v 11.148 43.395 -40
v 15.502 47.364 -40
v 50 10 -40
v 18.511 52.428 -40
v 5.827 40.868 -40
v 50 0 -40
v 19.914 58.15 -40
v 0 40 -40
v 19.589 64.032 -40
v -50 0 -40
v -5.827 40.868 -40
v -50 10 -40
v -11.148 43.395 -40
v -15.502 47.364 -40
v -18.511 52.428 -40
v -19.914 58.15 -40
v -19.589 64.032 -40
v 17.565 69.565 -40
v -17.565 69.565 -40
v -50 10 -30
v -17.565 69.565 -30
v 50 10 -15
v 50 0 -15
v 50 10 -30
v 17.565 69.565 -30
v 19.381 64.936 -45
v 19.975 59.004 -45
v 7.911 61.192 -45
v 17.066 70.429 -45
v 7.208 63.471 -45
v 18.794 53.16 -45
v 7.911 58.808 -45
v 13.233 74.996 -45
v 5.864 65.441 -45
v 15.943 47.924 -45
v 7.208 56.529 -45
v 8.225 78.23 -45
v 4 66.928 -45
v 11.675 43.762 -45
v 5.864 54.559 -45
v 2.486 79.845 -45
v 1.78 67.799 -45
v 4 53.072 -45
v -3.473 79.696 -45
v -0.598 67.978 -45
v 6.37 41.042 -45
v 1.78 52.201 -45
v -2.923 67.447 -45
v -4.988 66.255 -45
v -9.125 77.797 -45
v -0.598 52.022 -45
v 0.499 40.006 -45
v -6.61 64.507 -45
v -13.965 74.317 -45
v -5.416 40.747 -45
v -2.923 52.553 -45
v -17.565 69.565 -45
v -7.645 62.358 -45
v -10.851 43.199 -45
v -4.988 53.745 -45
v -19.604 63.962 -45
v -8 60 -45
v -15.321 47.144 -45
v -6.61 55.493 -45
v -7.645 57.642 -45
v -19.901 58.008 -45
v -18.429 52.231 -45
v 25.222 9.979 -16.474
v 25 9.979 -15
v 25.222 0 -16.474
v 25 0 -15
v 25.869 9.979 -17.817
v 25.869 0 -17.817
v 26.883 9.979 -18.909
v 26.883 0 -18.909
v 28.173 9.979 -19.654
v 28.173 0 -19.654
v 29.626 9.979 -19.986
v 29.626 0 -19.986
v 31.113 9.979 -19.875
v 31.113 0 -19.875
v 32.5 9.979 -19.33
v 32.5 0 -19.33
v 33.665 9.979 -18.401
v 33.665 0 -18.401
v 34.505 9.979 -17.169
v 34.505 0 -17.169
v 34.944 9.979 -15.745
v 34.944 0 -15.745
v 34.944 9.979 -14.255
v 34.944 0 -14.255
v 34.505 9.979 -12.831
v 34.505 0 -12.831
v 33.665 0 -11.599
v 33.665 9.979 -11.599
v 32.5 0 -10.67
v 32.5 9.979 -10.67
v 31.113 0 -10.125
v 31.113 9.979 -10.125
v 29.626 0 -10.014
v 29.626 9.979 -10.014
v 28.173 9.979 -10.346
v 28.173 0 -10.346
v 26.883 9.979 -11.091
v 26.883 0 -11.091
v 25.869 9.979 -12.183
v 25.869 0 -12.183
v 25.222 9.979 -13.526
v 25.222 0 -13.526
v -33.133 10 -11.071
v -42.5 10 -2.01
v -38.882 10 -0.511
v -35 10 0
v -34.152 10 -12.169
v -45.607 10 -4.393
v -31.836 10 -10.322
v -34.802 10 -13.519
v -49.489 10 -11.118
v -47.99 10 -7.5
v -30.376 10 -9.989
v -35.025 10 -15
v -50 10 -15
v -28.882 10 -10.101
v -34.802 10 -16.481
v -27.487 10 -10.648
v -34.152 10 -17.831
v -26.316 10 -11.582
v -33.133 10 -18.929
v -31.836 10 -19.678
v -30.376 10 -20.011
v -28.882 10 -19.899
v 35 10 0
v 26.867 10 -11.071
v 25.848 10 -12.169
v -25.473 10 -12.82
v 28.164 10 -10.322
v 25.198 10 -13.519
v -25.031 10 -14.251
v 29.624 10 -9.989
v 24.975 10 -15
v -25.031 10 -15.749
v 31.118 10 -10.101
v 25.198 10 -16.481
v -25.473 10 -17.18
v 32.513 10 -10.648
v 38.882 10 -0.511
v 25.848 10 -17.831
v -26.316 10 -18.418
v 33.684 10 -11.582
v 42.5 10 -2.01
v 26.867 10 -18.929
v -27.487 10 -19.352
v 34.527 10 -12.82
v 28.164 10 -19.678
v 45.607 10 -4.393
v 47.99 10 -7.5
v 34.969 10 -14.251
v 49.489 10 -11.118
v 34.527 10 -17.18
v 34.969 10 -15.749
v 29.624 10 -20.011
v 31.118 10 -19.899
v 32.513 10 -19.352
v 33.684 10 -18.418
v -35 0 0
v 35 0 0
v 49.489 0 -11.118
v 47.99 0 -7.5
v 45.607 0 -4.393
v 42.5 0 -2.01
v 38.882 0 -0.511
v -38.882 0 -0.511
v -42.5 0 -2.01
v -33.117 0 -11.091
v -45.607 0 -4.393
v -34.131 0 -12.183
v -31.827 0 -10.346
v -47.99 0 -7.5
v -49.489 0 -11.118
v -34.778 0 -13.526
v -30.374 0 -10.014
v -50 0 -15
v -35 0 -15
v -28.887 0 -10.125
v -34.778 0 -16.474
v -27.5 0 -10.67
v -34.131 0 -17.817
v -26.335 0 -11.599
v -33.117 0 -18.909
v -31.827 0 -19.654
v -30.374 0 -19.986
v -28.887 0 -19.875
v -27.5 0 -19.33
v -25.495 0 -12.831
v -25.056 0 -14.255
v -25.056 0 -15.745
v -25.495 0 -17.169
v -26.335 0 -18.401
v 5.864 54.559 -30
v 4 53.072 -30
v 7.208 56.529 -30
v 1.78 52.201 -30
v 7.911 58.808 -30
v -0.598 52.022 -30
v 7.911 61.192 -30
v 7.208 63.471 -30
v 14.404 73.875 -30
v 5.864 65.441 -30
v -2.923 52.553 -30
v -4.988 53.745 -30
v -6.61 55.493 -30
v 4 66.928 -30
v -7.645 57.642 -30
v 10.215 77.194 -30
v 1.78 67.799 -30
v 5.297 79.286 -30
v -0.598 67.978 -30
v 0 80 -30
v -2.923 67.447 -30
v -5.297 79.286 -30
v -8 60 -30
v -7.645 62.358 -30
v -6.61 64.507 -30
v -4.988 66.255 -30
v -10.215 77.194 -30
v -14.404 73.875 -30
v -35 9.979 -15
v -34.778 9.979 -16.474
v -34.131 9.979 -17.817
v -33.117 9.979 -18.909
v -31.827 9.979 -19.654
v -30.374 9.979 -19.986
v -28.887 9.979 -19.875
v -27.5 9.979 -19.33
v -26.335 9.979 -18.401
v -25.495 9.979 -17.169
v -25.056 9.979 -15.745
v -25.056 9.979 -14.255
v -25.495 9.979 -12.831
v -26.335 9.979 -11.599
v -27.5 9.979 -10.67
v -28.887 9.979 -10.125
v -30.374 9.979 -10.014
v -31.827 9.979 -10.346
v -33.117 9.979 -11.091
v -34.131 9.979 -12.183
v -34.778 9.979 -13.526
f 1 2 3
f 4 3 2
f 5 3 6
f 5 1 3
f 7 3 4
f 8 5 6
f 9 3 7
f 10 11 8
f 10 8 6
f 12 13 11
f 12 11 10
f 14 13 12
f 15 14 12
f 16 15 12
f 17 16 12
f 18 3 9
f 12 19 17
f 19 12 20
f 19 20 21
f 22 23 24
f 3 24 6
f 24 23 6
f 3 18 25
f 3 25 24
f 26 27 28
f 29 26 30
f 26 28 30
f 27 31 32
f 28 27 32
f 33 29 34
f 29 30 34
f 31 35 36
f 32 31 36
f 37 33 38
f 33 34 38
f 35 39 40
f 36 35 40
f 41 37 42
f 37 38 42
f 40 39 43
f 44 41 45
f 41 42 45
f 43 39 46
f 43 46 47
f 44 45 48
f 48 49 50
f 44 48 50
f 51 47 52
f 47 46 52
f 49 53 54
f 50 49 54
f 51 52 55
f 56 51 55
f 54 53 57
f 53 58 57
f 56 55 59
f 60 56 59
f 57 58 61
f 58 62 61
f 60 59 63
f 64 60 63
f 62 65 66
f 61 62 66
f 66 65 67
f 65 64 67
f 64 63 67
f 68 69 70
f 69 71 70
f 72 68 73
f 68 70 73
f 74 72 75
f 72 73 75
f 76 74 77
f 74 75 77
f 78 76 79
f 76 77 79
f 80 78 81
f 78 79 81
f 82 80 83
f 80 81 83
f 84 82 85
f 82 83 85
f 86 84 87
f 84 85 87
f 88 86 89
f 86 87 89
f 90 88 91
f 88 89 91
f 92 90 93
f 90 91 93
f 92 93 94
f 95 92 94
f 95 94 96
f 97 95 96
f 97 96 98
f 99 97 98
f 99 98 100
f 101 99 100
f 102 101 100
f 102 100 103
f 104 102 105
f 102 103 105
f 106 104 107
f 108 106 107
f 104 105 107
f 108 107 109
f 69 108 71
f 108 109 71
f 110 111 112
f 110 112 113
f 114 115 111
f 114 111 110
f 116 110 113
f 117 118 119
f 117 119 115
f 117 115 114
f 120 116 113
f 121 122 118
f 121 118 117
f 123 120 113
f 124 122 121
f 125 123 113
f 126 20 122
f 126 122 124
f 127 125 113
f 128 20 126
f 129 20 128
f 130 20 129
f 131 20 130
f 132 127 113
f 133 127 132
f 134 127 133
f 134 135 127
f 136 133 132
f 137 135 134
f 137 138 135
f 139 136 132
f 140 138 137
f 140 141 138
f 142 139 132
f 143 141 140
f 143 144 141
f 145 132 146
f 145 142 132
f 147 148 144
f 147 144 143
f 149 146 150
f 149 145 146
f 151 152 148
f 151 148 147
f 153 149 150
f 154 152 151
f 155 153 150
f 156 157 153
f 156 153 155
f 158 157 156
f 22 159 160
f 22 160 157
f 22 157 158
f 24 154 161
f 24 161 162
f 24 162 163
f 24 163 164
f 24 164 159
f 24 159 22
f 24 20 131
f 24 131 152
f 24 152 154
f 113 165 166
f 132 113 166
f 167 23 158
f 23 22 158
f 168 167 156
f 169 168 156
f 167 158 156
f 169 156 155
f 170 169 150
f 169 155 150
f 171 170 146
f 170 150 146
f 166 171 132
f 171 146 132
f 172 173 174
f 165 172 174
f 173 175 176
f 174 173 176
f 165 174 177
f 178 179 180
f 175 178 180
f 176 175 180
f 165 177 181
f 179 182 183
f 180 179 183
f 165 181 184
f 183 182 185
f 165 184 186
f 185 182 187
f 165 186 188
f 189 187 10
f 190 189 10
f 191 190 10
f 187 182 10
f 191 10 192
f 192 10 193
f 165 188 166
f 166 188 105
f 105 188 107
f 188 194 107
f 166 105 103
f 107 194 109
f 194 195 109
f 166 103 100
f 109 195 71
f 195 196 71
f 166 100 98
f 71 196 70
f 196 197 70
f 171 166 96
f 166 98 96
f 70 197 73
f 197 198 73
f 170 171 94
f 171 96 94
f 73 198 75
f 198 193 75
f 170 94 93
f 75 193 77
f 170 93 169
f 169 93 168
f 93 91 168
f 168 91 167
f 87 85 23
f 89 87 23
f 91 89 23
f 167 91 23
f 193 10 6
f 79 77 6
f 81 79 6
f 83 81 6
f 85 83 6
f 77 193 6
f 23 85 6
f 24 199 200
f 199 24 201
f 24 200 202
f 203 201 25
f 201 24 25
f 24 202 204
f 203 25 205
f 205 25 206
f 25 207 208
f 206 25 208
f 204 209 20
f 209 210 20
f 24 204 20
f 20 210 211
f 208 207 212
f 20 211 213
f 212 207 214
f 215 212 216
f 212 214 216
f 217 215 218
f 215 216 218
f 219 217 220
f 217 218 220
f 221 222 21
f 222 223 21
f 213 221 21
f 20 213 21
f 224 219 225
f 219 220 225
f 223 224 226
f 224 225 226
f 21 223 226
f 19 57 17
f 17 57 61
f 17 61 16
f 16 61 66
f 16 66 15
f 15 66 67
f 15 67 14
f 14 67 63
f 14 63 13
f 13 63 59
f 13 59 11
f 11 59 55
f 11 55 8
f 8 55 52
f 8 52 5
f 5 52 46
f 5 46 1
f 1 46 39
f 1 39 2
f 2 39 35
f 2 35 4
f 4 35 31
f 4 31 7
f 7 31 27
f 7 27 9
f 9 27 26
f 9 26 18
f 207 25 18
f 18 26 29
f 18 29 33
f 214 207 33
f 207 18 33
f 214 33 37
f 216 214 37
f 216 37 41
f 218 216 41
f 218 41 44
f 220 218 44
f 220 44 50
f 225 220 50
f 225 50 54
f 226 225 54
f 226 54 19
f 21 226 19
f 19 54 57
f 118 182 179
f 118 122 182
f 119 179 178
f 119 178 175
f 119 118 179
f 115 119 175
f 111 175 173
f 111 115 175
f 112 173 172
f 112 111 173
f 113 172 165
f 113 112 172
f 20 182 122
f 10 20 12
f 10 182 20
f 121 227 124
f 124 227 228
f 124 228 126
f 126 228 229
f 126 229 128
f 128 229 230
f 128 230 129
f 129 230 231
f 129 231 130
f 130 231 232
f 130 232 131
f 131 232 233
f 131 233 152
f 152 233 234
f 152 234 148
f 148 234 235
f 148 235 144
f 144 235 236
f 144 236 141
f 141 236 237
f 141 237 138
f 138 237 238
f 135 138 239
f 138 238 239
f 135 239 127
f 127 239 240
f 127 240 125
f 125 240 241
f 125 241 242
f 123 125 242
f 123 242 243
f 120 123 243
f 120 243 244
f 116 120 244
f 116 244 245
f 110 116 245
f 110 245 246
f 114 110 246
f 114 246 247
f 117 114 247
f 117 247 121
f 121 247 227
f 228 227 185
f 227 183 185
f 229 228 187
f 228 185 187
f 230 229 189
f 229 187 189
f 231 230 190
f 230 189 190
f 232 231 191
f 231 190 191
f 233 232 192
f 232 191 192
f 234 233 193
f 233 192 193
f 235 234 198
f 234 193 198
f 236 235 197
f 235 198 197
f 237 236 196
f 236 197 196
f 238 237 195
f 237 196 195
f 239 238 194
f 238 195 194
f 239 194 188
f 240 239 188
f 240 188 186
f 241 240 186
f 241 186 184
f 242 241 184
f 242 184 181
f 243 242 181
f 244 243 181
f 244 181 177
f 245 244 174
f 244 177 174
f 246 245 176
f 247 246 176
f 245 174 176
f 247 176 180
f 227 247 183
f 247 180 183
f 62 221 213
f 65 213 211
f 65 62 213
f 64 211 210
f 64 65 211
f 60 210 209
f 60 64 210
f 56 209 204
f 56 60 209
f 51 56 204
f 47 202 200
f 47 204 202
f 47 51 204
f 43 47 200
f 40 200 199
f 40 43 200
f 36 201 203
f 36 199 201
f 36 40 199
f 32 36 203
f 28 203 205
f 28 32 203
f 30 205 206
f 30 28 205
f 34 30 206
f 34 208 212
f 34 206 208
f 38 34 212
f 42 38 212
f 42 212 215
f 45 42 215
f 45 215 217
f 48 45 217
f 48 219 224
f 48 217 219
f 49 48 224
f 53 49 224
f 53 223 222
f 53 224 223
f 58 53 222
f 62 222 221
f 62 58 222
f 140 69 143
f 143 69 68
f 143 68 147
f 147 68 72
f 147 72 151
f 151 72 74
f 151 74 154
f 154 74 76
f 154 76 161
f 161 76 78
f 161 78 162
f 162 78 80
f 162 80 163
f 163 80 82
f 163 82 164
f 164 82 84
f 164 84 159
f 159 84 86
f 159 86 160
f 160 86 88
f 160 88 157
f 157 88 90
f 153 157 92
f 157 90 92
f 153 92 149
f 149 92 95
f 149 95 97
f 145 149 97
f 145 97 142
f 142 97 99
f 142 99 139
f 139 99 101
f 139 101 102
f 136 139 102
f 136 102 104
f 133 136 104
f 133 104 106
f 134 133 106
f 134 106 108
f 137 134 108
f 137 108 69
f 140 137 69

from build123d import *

# Parameters (mm, degrees)
CROQUIS1_W                           = 100
CROQUIS1_H                           = 40
SALIENTE_EXTRUIR1_DEPTH              = 10
CROQUIS2_R                           = 8
SALIENTE_EXTRUIR2_DEPTH              = 10
SALIENTE_EXTRUIR3_START              = -15
CROQUIS3_R                           = 20
CROQUIS3_R_2                         = 8
SALIENTE_EXTRUIR3_DEPTH              = 15
F_10_0_10_DIAMETER_HOLE1_D           = 10
F_10_0_10_DIAMETER_HOLE1_CSINK_D     = 10.05
F_10_0_10_DIAMETER_HOLE1_CSINK_ANGLE = 100
F_10_0_10_DIAMETER_HOLE2_D           = 10
F_10_0_10_DIAMETER_HOLE2_CSINK_D     = 10.05
F_10_0_10_DIAMETER_HOLE2_CSINK_ANGLE = 100
REDONDEO2_R                          = 15


with BuildPart() as part:
    # Croquis1 → Saliente-Extruir1 (new body)
    with BuildSketch(Plane(origin=(0, 0, 0), x_dir=(1, 0, 0), z_dir=(0, 1, 0))):
        with Locations((0, 20)):
            Rectangle(CROQUIS1_W, CROQUIS1_H)
    extrude(amount=SALIENTE_EXTRUIR1_DEPTH)

    # Croquis2 → Saliente-Extruir2 (add)
    with BuildSketch(Plane(origin=(0, 0, -40), x_dir=(-1, 0, 0), z_dir=(0, 0, -1))):
        with BuildLine():
            Line((-17.564659966, 69.564659966), (-50, 10))
            Line((-50, 10), (50, 10))
            Line((50, 10), (17.564659966, 69.564659966))
            ThreePointArc((17.564659966, 69.564659966), (0, 80), (-17.564659966, 69.564659966))
        make_face()
        with Locations((0, 60)):
            Circle(CROQUIS2_R, mode=Mode.SUBTRACT)
    extrude(amount=-SALIENTE_EXTRUIR2_DEPTH)

    # Croquis3 → Saliente-Extruir3 (add)
    with BuildSketch(Plane.XY.offset(-30).offset(SALIENTE_EXTRUIR3_START)):
        with Locations(Location((0, 60, 0), (0, 0, 151.429940189))):
            Circle(CROQUIS3_R)
        with Locations(Location((0, 60, 0), (0, 0, 180))):
            Circle(CROQUIS3_R_2, mode=Mode.SUBTRACT)
    extrude(amount=SALIENTE_EXTRUIR3_DEPTH)

    # Ø10.0 (10) Diameter Hole1 (through all)
    with Locations(Plane(origin=(0, 10, 0), x_dir=(1, 0, 0), z_dir=(0, 1, 0))):
        with Locations((30, 15)):
            CounterSinkHole(F_10_0_10_DIAMETER_HOLE1_D / 2, F_10_0_10_DIAMETER_HOLE1_CSINK_D / 2, counter_sink_angle=F_10_0_10_DIAMETER_HOLE1_CSINK_ANGLE)

    # Ø10.0 (10) Diameter Hole2 (through all)
    with Locations(Plane(origin=(0, 10, 0), x_dir=(1, 0, 0), z_dir=(0, 1, 0))):
        with Locations((-30, 15)):
            CounterSinkHole(F_10_0_10_DIAMETER_HOLE2_D / 2, F_10_0_10_DIAMETER_HOLE2_CSINK_D / 2, counter_sink_angle=F_10_0_10_DIAMETER_HOLE2_CSINK_ANGLE)

    # Redondeo2
    redondeo2_edges = [part.edges().sort_by_distance(p)[0] for p in [
        (50, 5, 0),
        (-50, 5, 0),
    ]]
    fillet(redondeo2_edges, radius=REDONDEO2_R)


solid = part.part
